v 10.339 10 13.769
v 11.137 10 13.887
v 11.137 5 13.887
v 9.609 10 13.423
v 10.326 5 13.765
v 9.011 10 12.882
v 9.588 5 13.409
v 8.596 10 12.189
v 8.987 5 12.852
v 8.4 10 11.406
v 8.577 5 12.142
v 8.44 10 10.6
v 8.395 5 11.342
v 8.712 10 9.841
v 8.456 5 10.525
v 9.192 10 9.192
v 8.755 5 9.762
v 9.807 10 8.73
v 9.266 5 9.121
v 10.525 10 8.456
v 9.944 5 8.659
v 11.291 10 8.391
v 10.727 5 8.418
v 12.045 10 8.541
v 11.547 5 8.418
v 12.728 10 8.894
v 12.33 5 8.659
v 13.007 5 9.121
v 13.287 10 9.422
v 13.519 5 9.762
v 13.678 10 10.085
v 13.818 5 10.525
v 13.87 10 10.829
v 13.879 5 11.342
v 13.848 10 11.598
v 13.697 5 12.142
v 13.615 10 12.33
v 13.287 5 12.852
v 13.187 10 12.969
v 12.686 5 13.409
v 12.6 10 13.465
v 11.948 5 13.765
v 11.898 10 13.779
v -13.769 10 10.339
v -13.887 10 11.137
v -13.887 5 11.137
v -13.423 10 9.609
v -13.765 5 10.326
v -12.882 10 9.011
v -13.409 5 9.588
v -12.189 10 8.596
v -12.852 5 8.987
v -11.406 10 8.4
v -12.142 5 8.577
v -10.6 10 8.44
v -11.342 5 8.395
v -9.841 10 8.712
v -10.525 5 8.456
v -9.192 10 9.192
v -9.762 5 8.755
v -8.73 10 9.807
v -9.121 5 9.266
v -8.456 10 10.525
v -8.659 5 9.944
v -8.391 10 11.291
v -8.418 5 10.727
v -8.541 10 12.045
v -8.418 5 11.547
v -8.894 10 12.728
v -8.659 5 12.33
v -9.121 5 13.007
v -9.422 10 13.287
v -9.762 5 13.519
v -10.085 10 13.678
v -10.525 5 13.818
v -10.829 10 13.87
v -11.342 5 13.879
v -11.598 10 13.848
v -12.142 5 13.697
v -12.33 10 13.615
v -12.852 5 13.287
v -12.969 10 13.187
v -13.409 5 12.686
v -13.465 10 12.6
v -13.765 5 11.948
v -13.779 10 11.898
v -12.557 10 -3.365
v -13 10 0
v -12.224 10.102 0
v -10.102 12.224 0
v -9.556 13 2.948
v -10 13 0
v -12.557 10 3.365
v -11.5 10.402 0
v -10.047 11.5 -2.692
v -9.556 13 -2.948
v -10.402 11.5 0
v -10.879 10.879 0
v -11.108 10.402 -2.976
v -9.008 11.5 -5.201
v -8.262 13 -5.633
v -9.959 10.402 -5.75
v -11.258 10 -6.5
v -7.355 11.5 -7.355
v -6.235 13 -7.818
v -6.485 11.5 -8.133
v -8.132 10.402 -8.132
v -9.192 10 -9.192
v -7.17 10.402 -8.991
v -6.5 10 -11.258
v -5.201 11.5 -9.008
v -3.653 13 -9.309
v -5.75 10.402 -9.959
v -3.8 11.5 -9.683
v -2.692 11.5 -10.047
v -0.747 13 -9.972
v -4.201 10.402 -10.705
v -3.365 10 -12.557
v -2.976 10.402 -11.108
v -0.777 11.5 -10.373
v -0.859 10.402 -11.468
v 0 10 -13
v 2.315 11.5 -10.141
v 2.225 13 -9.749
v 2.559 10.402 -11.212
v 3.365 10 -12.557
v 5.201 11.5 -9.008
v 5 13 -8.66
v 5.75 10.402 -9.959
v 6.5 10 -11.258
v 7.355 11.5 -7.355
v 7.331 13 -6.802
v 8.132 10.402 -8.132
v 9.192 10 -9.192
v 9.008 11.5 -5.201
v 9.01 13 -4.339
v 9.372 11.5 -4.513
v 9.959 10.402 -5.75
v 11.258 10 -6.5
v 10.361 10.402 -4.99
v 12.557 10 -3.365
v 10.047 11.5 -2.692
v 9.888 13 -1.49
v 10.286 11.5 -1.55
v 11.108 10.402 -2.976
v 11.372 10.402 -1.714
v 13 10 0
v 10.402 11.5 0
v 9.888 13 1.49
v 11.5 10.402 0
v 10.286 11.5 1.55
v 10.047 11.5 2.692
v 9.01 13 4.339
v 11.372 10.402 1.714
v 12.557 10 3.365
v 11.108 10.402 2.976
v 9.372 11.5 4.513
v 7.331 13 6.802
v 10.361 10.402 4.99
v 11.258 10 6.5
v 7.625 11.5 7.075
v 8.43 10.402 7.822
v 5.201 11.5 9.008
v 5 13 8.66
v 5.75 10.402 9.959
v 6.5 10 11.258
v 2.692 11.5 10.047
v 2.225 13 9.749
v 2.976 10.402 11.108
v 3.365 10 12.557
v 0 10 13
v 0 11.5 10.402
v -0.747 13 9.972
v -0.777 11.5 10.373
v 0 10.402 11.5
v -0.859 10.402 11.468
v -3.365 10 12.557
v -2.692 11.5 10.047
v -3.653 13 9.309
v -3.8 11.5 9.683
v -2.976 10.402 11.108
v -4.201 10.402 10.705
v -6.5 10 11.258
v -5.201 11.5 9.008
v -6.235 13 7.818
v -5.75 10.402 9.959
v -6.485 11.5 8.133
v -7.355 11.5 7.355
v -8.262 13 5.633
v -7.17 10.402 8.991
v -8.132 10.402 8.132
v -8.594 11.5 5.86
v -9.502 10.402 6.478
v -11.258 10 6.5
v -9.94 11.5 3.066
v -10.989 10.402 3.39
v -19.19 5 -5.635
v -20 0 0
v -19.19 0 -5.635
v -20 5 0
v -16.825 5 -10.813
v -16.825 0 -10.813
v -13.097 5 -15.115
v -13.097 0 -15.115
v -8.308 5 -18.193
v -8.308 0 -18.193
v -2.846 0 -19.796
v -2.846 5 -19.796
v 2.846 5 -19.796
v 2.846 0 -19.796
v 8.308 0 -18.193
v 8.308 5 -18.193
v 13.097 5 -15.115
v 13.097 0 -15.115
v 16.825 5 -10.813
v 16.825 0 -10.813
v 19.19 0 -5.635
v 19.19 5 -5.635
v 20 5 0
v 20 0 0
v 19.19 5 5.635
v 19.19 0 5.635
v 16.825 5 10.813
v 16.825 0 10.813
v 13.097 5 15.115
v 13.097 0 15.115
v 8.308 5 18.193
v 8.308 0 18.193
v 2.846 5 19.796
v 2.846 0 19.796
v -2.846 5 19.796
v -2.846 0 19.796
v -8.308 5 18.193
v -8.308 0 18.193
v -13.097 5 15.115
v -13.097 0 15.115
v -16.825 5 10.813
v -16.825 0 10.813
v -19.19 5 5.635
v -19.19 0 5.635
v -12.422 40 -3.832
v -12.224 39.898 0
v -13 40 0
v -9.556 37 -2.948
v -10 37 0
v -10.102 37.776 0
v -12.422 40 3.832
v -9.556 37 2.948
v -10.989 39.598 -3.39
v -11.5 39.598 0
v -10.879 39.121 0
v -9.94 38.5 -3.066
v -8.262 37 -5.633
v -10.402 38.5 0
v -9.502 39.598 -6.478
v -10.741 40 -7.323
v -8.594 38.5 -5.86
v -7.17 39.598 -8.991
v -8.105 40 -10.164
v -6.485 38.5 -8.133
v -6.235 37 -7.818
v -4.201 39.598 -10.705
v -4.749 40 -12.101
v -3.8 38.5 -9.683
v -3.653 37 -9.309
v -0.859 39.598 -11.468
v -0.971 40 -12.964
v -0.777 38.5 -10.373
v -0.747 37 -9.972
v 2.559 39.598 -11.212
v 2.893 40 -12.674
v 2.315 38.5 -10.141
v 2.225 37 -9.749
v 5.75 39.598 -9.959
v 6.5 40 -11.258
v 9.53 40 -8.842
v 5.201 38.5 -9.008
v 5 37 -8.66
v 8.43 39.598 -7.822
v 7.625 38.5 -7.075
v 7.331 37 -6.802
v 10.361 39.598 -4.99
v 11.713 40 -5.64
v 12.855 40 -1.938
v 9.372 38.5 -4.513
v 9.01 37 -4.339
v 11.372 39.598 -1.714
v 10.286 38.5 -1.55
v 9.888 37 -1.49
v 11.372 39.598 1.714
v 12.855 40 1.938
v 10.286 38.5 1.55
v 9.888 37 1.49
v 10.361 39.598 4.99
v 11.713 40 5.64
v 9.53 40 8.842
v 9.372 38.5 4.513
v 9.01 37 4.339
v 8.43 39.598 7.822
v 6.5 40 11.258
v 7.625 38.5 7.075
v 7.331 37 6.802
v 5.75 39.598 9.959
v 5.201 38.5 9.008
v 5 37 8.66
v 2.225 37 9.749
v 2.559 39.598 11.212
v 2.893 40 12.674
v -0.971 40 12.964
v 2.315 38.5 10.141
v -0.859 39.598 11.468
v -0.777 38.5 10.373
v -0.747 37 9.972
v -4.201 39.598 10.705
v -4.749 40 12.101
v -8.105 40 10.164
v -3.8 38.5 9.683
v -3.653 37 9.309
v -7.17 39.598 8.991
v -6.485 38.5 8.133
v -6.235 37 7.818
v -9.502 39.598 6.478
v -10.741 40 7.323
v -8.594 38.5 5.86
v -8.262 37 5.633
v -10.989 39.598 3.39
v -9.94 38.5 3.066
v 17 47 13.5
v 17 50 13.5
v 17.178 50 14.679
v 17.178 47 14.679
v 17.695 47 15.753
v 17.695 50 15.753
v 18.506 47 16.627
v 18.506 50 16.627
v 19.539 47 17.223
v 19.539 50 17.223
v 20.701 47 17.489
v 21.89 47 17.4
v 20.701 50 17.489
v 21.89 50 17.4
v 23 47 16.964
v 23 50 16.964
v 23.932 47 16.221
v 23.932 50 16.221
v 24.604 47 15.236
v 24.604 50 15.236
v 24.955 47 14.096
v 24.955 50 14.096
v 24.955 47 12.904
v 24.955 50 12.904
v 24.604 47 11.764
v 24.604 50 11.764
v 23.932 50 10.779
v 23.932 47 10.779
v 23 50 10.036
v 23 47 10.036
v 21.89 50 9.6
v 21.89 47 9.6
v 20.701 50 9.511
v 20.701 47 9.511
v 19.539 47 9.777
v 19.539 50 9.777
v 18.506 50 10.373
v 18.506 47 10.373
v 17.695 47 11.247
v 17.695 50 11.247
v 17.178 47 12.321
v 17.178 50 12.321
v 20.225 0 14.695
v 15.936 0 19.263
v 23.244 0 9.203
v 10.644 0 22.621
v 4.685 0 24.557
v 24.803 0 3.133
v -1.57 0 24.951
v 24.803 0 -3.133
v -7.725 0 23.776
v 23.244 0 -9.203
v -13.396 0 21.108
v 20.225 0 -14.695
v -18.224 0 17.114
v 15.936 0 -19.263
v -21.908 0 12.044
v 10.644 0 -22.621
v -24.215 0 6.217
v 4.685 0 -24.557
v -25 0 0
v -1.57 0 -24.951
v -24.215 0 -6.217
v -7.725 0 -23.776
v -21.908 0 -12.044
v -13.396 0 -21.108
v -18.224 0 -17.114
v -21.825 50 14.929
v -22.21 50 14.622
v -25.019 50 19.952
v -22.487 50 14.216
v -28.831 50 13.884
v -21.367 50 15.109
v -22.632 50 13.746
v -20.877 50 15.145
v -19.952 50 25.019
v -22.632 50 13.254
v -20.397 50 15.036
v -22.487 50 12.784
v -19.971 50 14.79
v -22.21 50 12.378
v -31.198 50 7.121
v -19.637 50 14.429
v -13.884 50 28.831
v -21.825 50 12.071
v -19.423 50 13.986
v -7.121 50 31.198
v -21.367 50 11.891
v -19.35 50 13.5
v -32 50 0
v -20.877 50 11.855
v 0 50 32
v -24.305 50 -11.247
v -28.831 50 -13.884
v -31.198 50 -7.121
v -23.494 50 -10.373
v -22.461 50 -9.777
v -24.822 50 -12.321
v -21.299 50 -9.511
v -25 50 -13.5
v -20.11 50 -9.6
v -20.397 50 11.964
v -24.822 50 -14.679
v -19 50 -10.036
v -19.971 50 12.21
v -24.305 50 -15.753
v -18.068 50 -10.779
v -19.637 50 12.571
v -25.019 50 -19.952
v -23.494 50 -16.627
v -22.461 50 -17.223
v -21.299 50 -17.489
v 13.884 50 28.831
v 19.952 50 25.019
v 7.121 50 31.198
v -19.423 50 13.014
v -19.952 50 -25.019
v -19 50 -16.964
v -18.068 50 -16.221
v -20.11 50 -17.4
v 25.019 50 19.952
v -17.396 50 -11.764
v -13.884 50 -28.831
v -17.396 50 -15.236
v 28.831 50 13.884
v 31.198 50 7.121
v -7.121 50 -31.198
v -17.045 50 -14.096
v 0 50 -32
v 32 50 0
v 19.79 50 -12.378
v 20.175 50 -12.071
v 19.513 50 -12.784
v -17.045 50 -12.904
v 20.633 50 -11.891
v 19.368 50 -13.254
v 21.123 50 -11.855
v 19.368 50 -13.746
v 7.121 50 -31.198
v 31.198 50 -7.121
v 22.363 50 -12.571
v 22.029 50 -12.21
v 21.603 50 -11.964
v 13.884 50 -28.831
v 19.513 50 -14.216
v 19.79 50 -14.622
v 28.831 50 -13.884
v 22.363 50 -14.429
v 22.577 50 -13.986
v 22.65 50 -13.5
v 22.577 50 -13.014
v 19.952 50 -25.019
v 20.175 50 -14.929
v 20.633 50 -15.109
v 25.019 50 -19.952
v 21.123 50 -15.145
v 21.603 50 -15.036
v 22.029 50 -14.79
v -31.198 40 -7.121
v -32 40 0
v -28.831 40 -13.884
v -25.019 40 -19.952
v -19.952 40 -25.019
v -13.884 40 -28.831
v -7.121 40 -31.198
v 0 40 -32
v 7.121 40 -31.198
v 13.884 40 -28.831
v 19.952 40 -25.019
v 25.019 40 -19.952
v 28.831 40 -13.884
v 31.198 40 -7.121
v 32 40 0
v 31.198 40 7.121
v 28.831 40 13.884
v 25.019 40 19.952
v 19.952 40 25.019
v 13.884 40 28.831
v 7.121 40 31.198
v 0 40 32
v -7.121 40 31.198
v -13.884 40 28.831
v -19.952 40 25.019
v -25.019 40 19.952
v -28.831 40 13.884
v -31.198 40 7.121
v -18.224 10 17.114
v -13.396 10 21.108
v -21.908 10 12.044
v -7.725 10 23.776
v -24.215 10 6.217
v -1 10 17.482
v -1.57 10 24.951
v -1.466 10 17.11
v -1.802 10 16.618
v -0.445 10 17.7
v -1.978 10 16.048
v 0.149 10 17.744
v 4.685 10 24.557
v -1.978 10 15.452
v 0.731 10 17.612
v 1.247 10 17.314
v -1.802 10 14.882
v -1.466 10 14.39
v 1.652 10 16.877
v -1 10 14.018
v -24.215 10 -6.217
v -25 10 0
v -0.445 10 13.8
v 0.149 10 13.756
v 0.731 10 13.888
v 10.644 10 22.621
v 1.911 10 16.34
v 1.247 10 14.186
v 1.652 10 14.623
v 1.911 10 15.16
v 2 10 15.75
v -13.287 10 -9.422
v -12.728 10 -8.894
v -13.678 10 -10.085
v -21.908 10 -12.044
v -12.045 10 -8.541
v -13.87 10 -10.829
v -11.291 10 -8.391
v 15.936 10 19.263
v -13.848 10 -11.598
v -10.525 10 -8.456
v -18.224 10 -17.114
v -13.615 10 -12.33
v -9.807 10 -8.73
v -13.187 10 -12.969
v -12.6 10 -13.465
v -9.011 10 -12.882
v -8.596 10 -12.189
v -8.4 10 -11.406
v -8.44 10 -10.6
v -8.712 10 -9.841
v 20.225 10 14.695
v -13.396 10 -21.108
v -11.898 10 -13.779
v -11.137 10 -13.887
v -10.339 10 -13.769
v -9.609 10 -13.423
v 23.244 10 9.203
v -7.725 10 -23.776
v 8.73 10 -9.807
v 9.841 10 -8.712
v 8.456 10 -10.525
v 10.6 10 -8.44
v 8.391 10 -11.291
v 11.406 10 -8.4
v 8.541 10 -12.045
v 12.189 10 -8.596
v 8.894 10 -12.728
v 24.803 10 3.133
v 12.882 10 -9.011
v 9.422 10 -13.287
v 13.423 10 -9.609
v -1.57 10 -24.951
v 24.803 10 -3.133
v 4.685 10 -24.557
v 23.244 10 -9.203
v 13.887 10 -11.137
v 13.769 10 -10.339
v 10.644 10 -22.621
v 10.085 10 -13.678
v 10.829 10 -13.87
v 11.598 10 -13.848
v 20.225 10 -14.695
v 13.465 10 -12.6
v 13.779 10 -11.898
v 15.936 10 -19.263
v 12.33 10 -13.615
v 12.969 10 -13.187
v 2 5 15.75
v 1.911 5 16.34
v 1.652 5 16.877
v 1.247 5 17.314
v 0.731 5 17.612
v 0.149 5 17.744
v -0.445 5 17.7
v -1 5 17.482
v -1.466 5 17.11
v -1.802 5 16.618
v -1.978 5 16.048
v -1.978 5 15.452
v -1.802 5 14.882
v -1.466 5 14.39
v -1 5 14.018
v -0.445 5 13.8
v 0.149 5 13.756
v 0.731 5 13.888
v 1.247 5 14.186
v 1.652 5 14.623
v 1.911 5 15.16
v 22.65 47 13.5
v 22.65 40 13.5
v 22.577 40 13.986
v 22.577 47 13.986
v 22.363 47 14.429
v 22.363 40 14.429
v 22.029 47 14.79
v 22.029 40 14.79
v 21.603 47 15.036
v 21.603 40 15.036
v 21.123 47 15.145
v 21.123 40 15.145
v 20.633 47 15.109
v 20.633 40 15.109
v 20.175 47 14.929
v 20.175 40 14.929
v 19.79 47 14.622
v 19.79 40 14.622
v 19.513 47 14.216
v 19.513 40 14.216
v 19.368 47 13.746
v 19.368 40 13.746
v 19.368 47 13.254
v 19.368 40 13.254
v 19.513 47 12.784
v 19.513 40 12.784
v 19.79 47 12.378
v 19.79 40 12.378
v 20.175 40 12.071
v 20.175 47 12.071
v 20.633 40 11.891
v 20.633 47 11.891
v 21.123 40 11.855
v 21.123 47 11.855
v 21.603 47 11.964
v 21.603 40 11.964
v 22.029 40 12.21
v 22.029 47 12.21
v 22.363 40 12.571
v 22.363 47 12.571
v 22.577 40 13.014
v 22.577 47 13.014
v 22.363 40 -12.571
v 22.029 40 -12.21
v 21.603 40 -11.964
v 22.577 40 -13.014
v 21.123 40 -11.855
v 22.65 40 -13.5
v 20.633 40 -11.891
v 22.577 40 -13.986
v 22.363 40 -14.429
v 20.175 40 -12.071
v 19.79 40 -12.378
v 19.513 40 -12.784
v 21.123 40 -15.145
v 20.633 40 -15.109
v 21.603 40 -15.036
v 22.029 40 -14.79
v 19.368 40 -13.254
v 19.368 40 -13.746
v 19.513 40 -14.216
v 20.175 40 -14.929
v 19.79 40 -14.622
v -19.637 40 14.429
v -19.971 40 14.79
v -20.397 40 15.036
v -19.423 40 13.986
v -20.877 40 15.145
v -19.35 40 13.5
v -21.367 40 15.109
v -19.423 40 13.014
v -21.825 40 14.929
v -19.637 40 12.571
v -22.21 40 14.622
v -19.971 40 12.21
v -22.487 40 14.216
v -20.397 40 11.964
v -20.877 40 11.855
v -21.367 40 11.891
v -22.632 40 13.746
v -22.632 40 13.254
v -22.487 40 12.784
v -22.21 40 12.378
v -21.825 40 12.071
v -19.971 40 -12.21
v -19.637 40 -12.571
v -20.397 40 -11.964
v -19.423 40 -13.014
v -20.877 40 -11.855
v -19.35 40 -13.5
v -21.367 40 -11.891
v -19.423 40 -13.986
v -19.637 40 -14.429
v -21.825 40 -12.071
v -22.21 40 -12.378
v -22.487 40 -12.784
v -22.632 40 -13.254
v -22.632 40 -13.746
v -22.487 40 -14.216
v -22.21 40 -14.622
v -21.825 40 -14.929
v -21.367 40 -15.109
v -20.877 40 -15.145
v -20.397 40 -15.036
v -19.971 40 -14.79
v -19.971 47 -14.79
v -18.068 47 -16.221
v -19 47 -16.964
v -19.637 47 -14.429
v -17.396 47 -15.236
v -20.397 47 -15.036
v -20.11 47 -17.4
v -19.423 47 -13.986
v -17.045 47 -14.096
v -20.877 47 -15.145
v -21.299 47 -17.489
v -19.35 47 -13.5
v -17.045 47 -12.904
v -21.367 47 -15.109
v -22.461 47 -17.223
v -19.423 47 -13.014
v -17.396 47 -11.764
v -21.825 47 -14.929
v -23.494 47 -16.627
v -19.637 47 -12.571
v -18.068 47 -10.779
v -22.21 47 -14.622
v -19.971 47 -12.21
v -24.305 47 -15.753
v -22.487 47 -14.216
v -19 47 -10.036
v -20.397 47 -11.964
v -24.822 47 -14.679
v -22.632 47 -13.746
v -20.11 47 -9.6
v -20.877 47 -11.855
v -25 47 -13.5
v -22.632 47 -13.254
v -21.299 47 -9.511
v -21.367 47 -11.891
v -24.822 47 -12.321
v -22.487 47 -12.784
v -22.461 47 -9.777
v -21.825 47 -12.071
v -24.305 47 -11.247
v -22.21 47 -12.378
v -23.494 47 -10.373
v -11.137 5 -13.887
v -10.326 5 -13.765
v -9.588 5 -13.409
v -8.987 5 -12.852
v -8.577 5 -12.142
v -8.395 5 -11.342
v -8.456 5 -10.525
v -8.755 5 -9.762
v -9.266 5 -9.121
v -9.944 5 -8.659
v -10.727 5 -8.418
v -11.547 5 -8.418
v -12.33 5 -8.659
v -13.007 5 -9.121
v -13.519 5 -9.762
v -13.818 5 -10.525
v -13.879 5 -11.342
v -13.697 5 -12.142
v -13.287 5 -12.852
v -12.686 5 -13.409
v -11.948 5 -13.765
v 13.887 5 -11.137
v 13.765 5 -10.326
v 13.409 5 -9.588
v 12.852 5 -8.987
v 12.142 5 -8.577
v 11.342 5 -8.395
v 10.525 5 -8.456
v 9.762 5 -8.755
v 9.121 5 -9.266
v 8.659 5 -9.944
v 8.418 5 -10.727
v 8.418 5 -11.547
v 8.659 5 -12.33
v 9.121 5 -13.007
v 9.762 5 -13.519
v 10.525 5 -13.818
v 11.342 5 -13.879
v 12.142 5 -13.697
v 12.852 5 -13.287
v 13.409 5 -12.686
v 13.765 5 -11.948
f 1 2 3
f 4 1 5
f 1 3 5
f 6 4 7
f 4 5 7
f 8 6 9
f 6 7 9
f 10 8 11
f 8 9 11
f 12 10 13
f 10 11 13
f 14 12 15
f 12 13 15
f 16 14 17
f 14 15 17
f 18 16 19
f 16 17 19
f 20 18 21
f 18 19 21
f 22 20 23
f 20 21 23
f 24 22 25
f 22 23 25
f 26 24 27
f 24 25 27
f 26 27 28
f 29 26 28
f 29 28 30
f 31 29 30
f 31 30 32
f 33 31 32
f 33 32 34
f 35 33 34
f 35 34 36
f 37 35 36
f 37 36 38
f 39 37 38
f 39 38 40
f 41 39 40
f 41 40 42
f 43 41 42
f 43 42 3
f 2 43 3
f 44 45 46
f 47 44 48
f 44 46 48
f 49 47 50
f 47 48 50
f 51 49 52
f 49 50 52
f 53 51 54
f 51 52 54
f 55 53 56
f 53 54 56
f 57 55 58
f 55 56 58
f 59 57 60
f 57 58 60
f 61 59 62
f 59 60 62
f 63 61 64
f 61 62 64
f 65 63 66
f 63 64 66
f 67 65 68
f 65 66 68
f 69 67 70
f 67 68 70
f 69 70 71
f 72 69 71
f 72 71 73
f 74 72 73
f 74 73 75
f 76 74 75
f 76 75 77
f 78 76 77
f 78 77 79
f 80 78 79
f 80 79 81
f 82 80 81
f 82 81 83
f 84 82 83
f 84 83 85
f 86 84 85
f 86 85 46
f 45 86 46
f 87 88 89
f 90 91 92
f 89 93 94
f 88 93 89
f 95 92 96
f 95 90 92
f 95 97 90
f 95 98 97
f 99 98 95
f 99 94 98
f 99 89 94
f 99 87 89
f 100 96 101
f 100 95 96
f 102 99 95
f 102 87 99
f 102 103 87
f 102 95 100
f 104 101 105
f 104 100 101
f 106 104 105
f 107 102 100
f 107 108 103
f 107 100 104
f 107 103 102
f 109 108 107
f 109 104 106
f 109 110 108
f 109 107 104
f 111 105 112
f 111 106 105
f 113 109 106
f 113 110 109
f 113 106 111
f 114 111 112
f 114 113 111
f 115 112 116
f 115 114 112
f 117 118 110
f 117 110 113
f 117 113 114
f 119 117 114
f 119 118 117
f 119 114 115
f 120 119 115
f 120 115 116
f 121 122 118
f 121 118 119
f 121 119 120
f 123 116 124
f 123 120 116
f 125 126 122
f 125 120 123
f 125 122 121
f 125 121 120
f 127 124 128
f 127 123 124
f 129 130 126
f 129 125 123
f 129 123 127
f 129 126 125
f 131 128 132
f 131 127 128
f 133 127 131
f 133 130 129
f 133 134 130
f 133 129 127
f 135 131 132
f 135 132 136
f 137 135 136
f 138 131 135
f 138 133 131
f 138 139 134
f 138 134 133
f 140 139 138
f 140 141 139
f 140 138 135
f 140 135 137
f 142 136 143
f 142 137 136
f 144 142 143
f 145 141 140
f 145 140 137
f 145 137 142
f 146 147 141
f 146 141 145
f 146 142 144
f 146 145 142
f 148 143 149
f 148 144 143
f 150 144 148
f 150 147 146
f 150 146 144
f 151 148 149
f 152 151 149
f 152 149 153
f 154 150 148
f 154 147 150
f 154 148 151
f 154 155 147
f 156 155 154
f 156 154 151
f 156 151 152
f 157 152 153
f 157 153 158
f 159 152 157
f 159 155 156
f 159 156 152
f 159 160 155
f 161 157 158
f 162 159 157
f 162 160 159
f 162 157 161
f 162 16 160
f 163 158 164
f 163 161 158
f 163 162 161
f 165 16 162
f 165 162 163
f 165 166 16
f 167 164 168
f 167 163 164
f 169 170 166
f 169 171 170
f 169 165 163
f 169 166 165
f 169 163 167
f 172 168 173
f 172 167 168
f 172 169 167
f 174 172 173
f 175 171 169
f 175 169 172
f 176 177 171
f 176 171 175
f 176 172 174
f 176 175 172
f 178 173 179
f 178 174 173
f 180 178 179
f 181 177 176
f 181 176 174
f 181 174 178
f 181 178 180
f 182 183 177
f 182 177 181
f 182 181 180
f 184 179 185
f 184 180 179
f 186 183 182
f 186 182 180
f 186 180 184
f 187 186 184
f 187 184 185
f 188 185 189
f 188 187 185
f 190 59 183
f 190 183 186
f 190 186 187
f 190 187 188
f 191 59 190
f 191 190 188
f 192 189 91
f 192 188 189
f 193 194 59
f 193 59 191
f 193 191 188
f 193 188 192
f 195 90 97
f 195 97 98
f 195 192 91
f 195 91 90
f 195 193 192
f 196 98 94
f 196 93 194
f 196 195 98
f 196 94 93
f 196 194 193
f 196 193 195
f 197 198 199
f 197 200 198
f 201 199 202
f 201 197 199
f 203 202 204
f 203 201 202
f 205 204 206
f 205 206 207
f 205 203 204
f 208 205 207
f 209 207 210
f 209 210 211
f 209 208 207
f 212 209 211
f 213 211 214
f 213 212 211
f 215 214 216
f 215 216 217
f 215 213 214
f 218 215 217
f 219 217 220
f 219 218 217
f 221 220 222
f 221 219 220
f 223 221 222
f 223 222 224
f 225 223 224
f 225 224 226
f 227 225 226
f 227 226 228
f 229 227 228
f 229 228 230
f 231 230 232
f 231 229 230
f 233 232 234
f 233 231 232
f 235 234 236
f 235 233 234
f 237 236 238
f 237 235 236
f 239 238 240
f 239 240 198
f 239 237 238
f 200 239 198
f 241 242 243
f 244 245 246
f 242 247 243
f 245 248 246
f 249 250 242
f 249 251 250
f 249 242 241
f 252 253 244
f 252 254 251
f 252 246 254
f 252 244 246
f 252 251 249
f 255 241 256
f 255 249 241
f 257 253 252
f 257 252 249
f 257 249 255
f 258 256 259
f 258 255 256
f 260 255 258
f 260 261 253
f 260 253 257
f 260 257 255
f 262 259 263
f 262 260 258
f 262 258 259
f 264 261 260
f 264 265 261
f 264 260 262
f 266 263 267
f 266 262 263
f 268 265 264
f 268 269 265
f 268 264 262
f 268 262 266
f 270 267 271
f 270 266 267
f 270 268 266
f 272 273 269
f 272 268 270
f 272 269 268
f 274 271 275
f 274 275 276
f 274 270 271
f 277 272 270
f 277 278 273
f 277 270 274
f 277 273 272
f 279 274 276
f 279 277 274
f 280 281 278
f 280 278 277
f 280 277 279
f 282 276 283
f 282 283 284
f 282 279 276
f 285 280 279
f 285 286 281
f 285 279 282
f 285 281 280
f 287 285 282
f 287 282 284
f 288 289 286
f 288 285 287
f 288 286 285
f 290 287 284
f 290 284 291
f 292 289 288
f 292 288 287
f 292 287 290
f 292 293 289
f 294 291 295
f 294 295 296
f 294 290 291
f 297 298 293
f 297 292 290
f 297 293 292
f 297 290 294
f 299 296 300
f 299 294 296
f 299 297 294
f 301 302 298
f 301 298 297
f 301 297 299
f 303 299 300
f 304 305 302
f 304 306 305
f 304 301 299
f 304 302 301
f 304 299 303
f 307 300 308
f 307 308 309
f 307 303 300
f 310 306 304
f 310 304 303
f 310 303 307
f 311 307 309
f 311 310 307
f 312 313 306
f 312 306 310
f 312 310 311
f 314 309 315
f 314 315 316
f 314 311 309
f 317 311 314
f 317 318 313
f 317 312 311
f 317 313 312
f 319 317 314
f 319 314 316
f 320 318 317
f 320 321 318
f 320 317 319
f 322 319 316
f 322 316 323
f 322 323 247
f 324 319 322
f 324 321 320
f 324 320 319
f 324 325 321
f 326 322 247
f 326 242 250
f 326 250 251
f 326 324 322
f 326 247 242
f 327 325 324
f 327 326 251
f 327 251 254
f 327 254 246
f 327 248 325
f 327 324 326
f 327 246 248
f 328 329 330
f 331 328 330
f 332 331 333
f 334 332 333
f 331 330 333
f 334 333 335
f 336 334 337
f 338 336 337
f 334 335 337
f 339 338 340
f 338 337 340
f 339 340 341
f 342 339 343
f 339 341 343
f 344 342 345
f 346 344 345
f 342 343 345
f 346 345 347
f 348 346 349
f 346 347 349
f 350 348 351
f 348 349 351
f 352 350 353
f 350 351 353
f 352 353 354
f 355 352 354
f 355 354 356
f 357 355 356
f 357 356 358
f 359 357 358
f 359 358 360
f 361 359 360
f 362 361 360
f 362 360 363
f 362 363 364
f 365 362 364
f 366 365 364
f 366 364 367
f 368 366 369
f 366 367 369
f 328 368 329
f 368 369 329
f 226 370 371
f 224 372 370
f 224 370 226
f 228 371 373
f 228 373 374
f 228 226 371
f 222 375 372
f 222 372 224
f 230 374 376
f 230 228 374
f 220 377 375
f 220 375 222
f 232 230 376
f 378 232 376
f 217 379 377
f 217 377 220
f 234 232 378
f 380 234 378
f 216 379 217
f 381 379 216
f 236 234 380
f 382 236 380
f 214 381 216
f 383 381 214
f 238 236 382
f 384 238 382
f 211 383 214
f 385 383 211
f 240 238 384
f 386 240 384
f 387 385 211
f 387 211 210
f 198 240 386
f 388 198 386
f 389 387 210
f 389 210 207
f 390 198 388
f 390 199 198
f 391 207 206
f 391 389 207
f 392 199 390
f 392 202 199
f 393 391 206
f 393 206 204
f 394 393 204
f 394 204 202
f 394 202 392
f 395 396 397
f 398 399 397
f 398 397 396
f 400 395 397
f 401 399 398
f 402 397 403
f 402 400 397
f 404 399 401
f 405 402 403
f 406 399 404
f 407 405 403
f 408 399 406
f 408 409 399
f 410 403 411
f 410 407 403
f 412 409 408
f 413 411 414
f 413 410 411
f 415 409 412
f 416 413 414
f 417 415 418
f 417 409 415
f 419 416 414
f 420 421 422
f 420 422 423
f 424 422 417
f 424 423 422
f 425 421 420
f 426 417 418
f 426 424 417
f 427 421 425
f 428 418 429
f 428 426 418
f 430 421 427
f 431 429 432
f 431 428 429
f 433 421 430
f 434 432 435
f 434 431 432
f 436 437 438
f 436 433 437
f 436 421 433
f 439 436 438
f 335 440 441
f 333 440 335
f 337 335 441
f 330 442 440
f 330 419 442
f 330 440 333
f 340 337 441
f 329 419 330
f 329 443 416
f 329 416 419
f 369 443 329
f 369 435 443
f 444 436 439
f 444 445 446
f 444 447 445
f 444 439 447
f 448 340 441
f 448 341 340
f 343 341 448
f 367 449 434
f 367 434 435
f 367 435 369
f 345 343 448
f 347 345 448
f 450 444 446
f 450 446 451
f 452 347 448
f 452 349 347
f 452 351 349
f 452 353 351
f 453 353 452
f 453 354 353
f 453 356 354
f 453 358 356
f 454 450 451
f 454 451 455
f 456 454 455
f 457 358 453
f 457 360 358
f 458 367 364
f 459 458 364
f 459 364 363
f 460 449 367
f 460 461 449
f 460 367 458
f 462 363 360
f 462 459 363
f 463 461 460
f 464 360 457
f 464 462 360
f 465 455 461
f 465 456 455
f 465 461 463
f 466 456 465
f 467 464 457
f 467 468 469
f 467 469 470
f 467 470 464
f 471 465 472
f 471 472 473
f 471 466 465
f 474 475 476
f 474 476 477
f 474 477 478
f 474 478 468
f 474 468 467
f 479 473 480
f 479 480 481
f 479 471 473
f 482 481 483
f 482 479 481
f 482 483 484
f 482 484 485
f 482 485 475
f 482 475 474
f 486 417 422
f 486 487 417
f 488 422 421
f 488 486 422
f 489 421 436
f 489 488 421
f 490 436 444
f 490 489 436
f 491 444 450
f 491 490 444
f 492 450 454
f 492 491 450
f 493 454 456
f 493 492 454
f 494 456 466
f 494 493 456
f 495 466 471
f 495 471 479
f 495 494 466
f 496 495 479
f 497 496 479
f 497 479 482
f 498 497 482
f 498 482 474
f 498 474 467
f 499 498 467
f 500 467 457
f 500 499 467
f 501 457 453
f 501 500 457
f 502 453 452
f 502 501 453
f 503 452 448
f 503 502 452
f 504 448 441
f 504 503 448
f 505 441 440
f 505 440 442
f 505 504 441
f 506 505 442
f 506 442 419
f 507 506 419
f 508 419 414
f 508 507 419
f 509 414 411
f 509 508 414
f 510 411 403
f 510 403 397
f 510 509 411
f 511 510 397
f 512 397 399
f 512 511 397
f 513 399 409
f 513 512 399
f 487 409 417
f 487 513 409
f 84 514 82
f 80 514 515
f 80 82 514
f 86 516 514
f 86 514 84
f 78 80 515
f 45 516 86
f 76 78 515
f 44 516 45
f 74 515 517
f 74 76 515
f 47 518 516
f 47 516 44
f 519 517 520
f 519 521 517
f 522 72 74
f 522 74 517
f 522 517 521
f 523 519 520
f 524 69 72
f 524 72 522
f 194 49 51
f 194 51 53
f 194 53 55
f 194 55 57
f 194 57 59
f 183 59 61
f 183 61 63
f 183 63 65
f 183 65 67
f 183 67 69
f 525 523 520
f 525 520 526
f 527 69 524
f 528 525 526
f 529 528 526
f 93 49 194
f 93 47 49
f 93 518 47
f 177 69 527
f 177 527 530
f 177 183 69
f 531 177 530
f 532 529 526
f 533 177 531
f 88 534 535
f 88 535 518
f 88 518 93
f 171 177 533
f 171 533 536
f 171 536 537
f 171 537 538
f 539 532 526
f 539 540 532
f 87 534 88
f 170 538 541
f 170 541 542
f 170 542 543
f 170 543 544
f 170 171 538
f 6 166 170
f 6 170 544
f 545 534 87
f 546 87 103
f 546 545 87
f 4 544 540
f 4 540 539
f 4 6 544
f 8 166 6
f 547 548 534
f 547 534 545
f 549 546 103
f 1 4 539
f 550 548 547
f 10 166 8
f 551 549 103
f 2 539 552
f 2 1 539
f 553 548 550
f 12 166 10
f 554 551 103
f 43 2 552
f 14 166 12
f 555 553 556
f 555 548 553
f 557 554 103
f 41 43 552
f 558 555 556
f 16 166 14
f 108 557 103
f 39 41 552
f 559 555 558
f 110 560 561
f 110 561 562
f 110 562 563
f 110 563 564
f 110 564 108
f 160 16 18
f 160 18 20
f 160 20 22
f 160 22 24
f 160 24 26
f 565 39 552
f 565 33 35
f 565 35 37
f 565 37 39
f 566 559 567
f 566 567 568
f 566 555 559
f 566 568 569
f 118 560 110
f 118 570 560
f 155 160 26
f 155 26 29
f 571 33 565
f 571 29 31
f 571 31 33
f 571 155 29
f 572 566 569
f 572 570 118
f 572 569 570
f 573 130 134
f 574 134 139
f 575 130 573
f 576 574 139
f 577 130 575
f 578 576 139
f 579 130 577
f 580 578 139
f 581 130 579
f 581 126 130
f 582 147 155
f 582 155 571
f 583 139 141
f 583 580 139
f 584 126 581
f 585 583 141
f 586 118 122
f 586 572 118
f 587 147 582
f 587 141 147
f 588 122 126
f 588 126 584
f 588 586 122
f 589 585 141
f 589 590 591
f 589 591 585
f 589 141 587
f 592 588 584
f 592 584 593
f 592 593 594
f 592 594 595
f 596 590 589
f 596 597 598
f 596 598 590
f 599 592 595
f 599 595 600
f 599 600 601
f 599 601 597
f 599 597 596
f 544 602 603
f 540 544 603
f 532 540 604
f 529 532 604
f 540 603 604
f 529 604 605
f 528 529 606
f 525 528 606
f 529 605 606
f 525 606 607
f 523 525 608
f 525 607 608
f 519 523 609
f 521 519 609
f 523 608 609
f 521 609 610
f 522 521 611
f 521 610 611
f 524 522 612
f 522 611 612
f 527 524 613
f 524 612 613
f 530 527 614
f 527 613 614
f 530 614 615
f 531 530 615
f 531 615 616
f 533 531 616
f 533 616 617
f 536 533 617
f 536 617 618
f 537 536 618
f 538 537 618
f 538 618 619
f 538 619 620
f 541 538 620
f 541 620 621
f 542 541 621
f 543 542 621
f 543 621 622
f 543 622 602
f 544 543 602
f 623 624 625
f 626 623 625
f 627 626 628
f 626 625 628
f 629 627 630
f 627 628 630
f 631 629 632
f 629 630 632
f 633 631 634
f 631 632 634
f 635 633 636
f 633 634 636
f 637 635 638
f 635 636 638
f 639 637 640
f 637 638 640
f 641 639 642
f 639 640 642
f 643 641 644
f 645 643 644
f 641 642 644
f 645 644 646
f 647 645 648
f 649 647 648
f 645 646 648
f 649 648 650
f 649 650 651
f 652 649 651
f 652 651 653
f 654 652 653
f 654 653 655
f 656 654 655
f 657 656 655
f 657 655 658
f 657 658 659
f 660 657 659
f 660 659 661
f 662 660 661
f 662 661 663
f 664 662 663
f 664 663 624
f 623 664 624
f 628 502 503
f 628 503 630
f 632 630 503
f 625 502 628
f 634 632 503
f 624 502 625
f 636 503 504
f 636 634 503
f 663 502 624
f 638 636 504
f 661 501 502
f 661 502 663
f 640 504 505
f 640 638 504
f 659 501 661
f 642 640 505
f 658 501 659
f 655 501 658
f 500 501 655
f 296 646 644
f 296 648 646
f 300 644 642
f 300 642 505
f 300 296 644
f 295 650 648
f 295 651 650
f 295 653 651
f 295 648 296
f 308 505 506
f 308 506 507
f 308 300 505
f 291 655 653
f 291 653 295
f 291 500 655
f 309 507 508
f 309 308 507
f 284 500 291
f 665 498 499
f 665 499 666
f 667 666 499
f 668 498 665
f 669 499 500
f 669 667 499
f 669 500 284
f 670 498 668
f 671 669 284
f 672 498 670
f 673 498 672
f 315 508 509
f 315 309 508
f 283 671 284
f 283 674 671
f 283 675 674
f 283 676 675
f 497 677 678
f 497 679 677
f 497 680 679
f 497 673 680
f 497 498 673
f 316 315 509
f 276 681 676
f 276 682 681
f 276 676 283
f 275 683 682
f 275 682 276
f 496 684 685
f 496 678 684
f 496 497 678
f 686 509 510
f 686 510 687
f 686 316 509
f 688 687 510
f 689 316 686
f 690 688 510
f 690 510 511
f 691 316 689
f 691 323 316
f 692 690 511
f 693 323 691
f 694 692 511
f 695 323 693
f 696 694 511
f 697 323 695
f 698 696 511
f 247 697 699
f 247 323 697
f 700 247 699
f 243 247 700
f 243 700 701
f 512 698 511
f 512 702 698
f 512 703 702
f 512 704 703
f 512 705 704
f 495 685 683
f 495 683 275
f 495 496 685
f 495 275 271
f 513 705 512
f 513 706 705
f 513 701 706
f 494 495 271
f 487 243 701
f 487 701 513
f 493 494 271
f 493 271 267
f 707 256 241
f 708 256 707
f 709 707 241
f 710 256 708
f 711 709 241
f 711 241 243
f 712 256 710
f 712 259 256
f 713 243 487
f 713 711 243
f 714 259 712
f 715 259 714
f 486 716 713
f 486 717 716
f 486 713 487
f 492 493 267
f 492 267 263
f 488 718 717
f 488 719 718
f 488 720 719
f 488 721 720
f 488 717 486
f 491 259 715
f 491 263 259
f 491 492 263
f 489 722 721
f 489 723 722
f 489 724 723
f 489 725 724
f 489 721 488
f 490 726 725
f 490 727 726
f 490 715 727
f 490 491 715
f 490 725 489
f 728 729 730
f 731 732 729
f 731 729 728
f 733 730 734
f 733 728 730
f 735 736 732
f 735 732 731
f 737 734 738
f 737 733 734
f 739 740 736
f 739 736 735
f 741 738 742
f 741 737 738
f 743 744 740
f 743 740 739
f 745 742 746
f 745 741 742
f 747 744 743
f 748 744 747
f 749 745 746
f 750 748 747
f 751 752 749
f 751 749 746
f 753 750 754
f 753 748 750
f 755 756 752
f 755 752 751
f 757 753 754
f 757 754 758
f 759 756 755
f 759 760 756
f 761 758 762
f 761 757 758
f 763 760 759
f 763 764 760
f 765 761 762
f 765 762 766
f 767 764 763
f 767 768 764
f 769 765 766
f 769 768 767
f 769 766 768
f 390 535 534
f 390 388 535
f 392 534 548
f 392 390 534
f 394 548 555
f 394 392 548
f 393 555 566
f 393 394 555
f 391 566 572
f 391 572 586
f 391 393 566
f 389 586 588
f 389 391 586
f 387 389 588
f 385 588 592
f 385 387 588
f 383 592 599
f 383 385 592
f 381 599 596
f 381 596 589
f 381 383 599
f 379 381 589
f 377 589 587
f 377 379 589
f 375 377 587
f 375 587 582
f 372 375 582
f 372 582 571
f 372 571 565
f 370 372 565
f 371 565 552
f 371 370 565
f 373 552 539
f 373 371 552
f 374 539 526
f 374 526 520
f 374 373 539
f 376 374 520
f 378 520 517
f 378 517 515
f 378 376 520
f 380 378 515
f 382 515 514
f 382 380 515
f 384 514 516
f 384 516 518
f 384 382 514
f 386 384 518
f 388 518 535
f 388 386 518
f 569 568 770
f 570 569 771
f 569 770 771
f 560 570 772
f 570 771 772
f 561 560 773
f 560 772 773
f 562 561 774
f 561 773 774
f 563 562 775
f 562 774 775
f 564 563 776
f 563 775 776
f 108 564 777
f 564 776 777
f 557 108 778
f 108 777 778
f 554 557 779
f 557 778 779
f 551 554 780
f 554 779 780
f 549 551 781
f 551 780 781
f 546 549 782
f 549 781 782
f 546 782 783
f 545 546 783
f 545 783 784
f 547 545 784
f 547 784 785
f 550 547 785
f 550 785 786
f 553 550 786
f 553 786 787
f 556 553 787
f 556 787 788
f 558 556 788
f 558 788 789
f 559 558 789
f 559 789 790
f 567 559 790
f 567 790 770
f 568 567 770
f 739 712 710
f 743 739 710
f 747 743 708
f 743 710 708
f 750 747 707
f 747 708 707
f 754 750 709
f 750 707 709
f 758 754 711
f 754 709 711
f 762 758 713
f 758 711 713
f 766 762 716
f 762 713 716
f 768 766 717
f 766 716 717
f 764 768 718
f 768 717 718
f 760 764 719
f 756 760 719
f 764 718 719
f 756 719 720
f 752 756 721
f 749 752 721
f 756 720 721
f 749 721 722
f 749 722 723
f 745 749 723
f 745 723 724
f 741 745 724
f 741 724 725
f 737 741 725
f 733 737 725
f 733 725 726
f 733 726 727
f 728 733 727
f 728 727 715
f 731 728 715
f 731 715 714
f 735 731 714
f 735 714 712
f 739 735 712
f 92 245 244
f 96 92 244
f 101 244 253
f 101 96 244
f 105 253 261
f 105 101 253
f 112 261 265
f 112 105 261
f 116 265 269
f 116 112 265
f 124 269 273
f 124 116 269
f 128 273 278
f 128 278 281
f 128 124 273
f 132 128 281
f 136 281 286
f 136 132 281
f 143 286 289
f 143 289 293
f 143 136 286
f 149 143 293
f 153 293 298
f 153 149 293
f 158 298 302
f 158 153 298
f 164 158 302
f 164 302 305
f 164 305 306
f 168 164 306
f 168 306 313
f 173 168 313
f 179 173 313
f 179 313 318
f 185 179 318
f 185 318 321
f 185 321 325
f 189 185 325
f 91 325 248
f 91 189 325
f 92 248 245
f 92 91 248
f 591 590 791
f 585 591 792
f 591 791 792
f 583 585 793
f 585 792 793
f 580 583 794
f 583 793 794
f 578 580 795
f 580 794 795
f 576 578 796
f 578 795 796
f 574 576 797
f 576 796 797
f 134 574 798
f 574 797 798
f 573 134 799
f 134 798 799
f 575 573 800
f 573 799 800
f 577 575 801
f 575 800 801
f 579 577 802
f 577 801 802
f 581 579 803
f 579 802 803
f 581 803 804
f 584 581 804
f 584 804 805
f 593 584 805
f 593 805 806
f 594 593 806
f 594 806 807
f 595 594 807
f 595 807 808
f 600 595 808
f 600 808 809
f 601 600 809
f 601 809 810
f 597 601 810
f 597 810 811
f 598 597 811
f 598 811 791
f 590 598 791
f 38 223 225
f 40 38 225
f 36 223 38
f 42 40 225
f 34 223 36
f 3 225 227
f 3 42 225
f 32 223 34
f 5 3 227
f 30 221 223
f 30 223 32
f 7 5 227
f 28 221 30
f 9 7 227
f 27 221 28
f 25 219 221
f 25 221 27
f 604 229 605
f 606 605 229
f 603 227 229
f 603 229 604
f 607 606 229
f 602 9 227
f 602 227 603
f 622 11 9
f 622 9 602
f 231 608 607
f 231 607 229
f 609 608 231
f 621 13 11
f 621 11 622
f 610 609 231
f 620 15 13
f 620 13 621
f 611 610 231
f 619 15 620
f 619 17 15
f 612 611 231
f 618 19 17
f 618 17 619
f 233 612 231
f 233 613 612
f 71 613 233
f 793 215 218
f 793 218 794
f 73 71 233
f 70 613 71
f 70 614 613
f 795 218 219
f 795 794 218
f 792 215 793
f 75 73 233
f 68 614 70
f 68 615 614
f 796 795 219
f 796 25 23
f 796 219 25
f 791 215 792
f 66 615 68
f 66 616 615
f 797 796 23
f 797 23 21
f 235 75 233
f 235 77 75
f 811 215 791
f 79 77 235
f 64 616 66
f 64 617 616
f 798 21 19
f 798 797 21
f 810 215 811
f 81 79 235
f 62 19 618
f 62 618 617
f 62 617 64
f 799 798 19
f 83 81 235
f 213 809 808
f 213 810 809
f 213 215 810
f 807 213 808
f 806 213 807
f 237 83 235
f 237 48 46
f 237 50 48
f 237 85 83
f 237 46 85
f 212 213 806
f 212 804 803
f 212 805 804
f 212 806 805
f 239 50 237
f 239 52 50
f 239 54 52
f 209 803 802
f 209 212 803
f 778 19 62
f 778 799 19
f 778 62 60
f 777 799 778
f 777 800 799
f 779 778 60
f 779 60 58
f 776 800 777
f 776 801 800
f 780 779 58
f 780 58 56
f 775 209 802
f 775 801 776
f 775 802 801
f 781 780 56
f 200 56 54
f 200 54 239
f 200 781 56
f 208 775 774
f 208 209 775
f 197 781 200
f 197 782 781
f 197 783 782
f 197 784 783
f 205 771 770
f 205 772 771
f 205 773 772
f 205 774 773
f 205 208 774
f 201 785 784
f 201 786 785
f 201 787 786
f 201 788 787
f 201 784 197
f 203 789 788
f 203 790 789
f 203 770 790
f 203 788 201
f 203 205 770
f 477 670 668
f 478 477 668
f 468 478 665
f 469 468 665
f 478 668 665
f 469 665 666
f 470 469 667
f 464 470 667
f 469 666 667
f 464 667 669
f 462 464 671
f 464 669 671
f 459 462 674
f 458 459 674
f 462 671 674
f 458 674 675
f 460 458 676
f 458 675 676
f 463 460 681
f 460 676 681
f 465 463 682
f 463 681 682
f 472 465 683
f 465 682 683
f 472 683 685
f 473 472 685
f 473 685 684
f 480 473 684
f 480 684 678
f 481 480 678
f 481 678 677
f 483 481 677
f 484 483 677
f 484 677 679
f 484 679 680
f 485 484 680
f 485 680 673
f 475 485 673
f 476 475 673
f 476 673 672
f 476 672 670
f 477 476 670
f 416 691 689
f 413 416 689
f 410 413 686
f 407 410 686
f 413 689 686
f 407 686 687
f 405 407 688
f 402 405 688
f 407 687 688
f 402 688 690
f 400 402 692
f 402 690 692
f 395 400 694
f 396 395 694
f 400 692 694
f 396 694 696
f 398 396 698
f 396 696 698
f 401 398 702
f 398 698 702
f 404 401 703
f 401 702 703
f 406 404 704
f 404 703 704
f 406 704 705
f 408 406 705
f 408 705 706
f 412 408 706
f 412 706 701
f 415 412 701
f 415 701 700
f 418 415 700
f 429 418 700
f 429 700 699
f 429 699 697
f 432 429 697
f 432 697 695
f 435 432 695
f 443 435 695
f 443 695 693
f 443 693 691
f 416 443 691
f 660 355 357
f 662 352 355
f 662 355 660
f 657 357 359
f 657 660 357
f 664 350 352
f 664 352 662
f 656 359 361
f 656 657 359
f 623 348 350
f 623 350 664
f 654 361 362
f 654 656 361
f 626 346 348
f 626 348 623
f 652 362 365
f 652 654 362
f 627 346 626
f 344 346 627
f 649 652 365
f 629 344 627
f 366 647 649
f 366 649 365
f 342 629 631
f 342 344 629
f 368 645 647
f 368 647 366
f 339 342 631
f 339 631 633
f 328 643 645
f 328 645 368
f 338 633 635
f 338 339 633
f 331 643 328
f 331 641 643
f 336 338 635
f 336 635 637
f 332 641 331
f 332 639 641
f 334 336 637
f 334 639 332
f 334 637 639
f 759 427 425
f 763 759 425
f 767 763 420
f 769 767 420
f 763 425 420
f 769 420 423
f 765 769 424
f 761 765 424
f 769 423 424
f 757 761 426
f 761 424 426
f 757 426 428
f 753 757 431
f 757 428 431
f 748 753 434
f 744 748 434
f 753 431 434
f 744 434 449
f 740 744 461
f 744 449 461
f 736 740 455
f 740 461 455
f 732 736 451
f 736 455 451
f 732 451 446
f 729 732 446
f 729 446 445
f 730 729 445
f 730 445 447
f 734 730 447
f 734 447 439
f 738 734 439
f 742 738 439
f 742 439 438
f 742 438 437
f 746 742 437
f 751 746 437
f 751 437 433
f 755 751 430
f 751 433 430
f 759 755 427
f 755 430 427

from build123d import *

# Parameters (mm, degrees)
F3_D            = 3.3
F3_DEPTH        = 14.1
F3_TIP          = 0.9914200214
F2_R            = 4
F4_DEPTH        = 3
F5_R            = 2.75
F6_DEPTH        = 25
F6_COPIES_COUNT = 4
F8_R            = 2
F9_DEPTH        = 25


# Not quite as in the source:
# - a pattern or mirror of a feature is missing from the dataset's text; its kind, count and spacing are read off the source's solid


with BuildPart() as f1:
    # F0 (on Top) → F1 (revolve)
    with BuildSketch(Plane.XY):
        with BuildLine():
            Line((-25, 0), (-20, 0))
            Line((-20, 0), (-20, 5))
            Line((-20, 5), (0, 5))
            Line((0, 5), (0, 50))
            Line((0, 50), (-32, 50))
            Line((-32, 50), (-32, 40))
            Line((-32, 40), (-13, 40))
            ThreePointArc((-13, 40), (-10.8786796564, 39.1213203436), (-10, 37))
            Line((-10, 37), (-10, 13))
            ThreePointArc((-10, 13), (-10.8786796564, 10.8786796564), (-13, 10))
            Line((-13, 10), (-25, 10))
            Line((-25, 10), (-25, 0))
        make_face()
    revolve(axis=Axis((0, 27.5, 0), (0, -1, 0)))

    # F3
    with Locations(Plane(origin=(0, 50, 0), x_dir=(-1, 0, 0), z_dir=(0, 1, 0))):
        with Locations((21, -13.5), (21, 13.5), (-21, 13.5), (-21, -13.5)):
            Hole(F3_D / 2, depth=F3_DEPTH)
            with Locations((0, 0, -(F3_DEPTH + F3_TIP / 2))):  # 118° drill point
                Cone(0, F3_D / 2, F3_TIP, mode=Mode.SUBTRACT)

    # F2 (on face) → F4 (cut)
    with BuildSketch(Plane(origin=(0, 50, 0), x_dir=(-1, 0, 0), z_dir=(0, 1, 0))):
        with Locations((21, -13.5)):
            Circle(F2_R)
        with Locations((-21, 13.5)):
            Circle(F2_R)
    extrude(amount=-F4_DEPTH, mode=Mode.SUBTRACT)

    # F5 (on face) → F6 (cut)
    with BuildSketch(Plane.XZ.offset(-5)):
        with Locations((11.1369318037, -11.1369318037)):
            Circle(F5_R)
    f6 = extrude(amount=-F6_DEPTH, mode=Mode.SUBTRACT)

    # F6_copies: F6 ×4 about axis
    f6_copies_axis = Axis((0, 0, 0), (0, 1, 0))
    for i in range(1, F6_COPIES_COUNT):
        add(f6.rotate(f6_copies_axis, i * 360 / F6_COPIES_COUNT), mode=Mode.SUBTRACT)

    # F8 (on face) → F9 (cut)
    with BuildSketch(Plane.XZ.offset(-5)):
        with Locations((0, 15.75)):
            Circle(F8_R)
    extrude(amount=-F9_DEPTH, mode=Mode.SUBTRACT)


solid = f1.part
